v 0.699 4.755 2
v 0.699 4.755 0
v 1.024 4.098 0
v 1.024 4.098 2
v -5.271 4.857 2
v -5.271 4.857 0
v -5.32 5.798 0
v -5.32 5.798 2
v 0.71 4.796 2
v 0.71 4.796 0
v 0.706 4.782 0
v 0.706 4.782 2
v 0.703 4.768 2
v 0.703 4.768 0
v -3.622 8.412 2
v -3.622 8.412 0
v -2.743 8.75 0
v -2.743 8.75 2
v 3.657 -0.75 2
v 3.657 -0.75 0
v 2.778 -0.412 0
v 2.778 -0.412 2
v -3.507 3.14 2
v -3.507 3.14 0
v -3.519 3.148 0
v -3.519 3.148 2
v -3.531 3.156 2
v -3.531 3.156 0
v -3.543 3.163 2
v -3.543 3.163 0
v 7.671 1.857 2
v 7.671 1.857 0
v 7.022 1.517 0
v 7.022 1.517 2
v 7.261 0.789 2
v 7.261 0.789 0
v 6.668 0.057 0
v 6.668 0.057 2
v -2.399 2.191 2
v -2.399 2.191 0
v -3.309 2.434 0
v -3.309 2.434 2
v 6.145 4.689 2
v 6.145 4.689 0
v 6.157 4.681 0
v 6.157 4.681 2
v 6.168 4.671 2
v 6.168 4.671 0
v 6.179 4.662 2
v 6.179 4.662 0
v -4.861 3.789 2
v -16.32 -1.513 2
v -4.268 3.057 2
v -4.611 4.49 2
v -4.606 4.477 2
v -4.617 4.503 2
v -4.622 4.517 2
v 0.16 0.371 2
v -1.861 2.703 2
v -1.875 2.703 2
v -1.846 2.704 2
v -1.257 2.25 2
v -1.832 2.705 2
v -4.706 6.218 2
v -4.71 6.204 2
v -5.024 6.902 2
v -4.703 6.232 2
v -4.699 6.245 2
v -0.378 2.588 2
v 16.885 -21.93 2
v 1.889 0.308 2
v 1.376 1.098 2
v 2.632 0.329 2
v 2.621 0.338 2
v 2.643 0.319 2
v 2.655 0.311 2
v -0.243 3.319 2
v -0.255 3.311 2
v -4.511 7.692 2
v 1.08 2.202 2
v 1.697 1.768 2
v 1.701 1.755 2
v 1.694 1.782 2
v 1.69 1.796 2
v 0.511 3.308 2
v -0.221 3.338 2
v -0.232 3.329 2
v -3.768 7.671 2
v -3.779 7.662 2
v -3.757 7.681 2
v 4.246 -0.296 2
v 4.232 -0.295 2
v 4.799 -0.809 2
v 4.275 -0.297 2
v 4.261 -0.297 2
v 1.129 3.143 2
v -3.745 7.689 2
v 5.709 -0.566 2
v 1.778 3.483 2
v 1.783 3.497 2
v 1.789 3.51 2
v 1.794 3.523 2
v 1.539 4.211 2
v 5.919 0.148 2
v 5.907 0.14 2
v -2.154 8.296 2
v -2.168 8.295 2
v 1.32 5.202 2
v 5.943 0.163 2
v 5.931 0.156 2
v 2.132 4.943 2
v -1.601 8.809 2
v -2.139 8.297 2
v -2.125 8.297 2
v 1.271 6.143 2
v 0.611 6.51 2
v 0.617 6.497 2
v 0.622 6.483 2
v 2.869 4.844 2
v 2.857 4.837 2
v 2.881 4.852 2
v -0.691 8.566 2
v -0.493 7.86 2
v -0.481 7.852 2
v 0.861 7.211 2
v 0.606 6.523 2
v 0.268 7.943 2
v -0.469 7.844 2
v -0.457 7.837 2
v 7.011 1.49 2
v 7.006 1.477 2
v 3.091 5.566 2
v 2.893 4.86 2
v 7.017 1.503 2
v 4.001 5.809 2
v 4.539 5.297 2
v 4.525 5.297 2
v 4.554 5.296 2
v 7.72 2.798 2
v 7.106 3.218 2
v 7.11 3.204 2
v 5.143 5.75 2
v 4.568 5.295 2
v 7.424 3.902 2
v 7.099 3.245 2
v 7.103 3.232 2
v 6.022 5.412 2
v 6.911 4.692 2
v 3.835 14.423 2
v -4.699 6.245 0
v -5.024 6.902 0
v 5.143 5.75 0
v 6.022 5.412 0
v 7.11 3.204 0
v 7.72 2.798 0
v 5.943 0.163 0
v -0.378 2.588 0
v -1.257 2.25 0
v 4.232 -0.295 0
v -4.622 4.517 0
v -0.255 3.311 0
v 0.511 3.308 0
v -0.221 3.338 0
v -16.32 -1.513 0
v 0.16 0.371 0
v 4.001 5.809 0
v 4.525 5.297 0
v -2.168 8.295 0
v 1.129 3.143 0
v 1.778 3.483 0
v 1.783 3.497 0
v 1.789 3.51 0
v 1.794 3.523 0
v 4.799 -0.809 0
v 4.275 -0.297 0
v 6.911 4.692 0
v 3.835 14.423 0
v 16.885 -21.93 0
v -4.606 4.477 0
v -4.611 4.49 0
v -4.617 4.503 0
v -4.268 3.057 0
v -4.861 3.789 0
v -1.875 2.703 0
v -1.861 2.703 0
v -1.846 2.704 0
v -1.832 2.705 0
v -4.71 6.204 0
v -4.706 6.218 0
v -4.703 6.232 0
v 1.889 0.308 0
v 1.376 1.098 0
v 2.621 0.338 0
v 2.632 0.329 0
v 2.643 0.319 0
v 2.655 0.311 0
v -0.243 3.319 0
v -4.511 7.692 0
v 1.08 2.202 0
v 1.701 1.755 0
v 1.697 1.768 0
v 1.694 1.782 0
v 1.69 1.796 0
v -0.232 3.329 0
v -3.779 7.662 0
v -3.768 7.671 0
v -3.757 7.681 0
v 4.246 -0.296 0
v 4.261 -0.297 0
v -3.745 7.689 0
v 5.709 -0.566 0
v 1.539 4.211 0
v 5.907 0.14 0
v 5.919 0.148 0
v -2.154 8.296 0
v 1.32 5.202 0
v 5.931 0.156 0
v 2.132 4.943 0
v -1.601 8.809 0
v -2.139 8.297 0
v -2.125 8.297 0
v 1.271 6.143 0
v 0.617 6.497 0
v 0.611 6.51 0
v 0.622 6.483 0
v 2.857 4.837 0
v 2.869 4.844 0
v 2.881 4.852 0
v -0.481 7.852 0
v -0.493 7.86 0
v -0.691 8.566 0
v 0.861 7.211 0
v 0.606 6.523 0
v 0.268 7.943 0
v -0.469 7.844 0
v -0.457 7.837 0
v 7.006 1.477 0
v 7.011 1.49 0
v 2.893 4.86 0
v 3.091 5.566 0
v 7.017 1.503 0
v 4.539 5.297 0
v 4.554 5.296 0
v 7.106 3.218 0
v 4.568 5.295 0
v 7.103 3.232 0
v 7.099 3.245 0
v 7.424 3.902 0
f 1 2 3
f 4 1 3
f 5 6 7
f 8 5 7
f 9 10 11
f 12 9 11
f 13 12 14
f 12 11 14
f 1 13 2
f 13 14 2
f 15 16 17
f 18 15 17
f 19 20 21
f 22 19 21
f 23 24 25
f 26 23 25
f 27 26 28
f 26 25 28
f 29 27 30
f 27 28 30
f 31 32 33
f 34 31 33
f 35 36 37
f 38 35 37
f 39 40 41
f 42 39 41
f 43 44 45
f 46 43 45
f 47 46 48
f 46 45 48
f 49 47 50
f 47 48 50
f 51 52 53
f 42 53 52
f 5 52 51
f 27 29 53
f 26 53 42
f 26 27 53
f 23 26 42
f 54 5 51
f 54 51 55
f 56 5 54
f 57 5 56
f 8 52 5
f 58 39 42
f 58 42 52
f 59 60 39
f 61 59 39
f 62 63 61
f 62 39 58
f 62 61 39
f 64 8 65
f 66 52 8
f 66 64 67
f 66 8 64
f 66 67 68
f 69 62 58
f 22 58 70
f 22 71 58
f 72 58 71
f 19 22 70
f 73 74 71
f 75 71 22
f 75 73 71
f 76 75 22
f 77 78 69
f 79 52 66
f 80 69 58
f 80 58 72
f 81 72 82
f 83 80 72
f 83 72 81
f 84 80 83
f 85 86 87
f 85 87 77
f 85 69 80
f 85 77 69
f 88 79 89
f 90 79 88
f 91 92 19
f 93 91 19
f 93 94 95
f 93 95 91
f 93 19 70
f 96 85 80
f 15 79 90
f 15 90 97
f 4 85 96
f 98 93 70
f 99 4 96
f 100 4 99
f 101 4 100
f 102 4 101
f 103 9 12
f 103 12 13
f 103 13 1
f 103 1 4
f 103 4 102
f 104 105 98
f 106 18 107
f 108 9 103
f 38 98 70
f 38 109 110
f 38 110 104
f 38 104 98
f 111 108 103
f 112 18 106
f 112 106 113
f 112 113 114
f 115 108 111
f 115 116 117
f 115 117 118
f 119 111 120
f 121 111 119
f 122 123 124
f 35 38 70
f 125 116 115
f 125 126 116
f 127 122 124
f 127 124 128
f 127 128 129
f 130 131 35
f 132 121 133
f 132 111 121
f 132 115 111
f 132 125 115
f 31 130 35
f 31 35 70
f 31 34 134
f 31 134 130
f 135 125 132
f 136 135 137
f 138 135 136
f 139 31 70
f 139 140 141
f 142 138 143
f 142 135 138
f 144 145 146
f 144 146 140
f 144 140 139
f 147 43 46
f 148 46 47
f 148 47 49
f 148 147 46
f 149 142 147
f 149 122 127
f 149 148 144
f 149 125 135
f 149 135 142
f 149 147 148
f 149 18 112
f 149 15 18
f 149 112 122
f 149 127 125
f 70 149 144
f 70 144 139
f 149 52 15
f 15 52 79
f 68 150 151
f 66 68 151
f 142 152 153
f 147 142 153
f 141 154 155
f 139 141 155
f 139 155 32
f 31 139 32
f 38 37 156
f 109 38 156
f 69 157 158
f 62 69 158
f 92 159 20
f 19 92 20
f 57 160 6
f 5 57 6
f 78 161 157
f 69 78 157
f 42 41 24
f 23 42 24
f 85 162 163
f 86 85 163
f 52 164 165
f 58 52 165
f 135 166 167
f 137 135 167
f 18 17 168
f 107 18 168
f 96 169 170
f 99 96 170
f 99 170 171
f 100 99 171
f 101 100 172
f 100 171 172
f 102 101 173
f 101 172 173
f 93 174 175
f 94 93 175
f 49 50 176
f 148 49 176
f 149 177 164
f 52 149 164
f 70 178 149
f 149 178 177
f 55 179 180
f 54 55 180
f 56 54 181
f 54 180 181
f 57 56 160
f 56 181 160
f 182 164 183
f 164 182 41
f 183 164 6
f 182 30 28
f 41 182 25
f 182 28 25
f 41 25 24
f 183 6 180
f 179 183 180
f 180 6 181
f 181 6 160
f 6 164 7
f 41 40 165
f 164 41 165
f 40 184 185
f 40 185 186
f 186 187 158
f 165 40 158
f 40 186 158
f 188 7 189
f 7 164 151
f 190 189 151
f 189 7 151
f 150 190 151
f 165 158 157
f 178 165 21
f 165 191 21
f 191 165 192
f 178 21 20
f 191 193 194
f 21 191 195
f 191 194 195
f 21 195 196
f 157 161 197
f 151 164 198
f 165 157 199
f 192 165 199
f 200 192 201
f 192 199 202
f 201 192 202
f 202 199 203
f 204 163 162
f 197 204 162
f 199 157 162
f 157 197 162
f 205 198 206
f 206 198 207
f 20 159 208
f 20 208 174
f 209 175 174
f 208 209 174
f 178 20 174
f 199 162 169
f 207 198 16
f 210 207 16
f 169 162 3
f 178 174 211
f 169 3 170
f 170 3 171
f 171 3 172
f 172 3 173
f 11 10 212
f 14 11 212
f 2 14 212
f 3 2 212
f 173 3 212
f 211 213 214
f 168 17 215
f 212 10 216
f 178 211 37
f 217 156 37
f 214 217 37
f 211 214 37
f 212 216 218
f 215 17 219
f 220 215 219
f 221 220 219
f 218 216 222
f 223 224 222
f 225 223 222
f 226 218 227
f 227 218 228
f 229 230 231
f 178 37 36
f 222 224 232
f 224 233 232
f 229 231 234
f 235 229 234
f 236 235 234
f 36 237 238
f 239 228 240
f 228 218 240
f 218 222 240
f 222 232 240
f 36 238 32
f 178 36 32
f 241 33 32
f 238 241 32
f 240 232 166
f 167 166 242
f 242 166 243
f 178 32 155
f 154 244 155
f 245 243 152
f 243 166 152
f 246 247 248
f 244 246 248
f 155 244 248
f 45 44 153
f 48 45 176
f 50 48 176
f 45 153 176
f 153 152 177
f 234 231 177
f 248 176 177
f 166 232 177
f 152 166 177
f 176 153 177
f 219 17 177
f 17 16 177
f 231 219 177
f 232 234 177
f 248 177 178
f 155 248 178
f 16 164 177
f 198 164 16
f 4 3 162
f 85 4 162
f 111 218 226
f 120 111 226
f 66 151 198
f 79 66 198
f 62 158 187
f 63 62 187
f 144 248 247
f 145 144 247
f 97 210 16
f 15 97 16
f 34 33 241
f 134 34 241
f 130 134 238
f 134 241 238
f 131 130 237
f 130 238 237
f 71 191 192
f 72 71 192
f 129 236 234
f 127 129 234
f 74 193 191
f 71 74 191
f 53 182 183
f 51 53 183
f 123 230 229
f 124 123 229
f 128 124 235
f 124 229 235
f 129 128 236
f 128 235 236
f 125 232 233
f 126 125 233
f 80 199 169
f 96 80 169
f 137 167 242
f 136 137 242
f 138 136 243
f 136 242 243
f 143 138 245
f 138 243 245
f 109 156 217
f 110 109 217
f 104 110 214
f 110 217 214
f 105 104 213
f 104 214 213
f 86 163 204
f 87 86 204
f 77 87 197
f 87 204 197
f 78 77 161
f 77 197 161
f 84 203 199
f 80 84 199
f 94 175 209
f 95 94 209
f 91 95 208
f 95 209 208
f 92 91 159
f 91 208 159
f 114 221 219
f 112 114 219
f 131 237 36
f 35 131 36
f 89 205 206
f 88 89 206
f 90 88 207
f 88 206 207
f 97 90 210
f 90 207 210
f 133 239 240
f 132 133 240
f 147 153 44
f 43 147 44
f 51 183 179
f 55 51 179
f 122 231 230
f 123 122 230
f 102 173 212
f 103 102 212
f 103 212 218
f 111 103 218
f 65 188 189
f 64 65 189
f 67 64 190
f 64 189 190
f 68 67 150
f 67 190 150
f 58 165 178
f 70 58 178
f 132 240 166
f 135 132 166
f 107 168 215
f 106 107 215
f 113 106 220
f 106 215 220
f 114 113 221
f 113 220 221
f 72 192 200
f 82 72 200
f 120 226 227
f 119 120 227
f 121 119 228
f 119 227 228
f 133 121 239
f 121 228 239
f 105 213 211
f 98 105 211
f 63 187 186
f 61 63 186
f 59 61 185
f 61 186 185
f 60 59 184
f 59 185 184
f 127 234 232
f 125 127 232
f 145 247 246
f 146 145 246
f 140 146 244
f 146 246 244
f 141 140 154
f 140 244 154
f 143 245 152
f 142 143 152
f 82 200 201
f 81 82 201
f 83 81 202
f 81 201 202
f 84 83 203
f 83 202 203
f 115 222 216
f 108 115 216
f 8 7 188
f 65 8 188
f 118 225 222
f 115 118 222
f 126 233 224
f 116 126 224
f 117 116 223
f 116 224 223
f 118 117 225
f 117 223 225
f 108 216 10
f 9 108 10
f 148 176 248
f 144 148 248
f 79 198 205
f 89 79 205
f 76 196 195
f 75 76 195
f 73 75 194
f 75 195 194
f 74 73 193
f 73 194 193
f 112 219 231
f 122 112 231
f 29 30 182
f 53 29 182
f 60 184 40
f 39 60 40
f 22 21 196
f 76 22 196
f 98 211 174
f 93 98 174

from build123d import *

# Parameters (mm, degrees)
F1_DEPTH = 2


with BuildPart() as f1:
    # F0 (on Top) → F1 (new body)
    with BuildSketch(Plane.XY):
        Polygon((16.885106, -21.930141), (3.835107, 14.423427), (-16.31955, -1.512813), (0.15961, 0.370519), align=None)
        with BuildLine():
            ThreePointArc((-4.606246, 4.476535), (-4.614025, 4.49657), (-4.62165, 4.516664))
            Line((-4.62165, 4.516664), (-5.270834, 4.857064))
            Line((-5.270834, 4.857064), (-5.320121, 5.797519))
            Line((-5.320121, 5.797519), (-4.710075, 6.203913))
            ThreePointArc((-4.710075, 6.203913), (-4.704592, 6.224693), (-4.69895, 6.245431))
            Line((-4.69895, 6.245431), (-5.024069, 6.902401))
            Line((-5.024069, 6.902401), (-4.511157, 7.692216))
            Line((-4.511157, 7.692216), (-3.778747, 7.662419))
            ThreePointArc((-3.778747, 7.662419), (-3.762097, 7.676009), (-3.745343, 7.68947))
            Line((-3.745343, 7.68947), (-3.622212, 8.41207))
            Line((-3.622212, 8.41207), (-2.743016, 8.749561))
            Line((-2.743016, 8.749561), (-2.167999, 8.294956))
            ThreePointArc((-2.167999, 8.294956), (-2.146541, 8.296163), (-2.125074, 8.297205))
            Line((-2.125074, 8.297205), (-1.600726, 8.809426))
            Line((-1.600726, 8.809426), (-0.691069, 8.565684))
            Line((-0.691069, 8.565684), (-0.49308, 7.859914))
            ThreePointArc((-0.49308, 7.859914), (-0.475011, 7.848278), (-0.457031, 7.836503))
            Line((-0.457031, 7.836503), (0.268252, 7.942694))
            Line((0.268252, 7.942694), (0.860912, 7.21082))
            Line((0.860912, 7.21082), (0.606246, 6.523465))
            ThreePointArc((0.606246, 6.523465), (0.614025, 6.50343), (0.62165, 6.483336))
            Line((0.62165, 6.483336), (1.270834, 6.142936))
            Line((1.270834, 6.142936), (1.320121, 5.202481))
            Line((1.320121, 5.202481), (0.710075, 4.796087))
            ThreePointArc((0.710075, 4.796087), (0.704592, 4.775307), (0.69895, 4.754569))
            Line((0.69895, 4.754569), (1.024069, 4.097599))
            Line((1.024069, 4.097599), (0.511157, 3.307784))
            Line((0.511157, 3.307784), (-0.221253, 3.337581))
            ThreePointArc((-0.221253, 3.337581), (-0.237903, 3.323991), (-0.254657, 3.31053))
            Line((-0.254657, 3.31053), (-0.377788, 2.58793))
            Line((-0.377788, 2.58793), (-1.256984, 2.250439))
            Line((-1.256984, 2.250439), (-1.832001, 2.705044))
            ThreePointArc((-1.832001, 2.705044), (-1.853459, 2.703837), (-1.874926, 2.702795))
            Line((-1.874926, 2.702795), (-2.399274, 2.190574))
            Line((-2.399274, 2.190574), (-3.308931, 2.434316))
            Line((-3.308931, 2.434316), (-3.50692, 3.140086))
            ThreePointArc((-3.50692, 3.140086), (-3.524989, 3.151722), (-3.542969, 3.163497))
            Line((-3.542969, 3.163497), (-4.268252, 3.057306))
            Line((-4.268252, 3.057306), (-4.860912, 3.78918))
            Line((-4.860912, 3.78918), (-4.606246, 4.476535))
        make_face(mode=Mode.SUBTRACT)
        with BuildLine():
            ThreePointArc((2.857031, 4.836503), (2.875011, 4.848278), (2.89308, 4.859914))
            Line((2.89308, 4.859914), (3.091069, 5.565684))
            Line((3.091069, 5.565684), (4.000726, 5.809426))
            Line((4.000726, 5.809426), (4.525074, 5.297205))
            ThreePointArc((4.525074, 5.297205), (4.546541, 5.296163), (4.567999, 5.294956))
            Line((4.567999, 5.294956), (5.143016, 5.749561))
            Line((5.143016, 5.749561), (6.022212, 5.41207))
            Line((6.022212, 5.41207), (6.145343, 4.68947))
            ThreePointArc((6.145343, 4.68947), (6.162097, 4.676009), (6.178747, 4.662419))
            Line((6.178747, 4.662419), (6.911157, 4.692216))
            Line((6.911157, 4.692216), (7.424069, 3.902401))
            Line((7.424069, 3.902401), (7.09895, 3.245431))
            ThreePointArc((7.09895, 3.245431), (7.104592, 3.224693), (7.110075, 3.203913))
            Line((7.110075, 3.203913), (7.720121, 2.797519))
            Line((7.720121, 2.797519), (7.670834, 1.857064))
            Line((7.670834, 1.857064), (7.02165, 1.516664))
            ThreePointArc((7.02165, 1.516664), (7.014025, 1.49657), (7.006246, 1.476535))
            Line((7.006246, 1.476535), (7.260912, 0.78918))
            Line((7.260912, 0.78918), (6.668252, 0.057306))
            Line((6.668252, 0.057306), (5.942969, 0.163497))
            ThreePointArc((5.942969, 0.163497), (5.924989, 0.151722), (5.90692, 0.140086))
            Line((5.90692, 0.140086), (5.708931, -0.565684))
            Line((5.708931, -0.565684), (4.799274, -0.809426))
            Line((4.799274, -0.809426), (4.274926, -0.297205))
            ThreePointArc((4.274926, -0.297205), (4.253459, -0.296163), (4.232001, -0.294956))
            Line((4.232001, -0.294956), (3.656984, -0.749561))
            Line((3.656984, -0.749561), (2.777788, -0.41207))
            Line((2.777788, -0.41207), (2.654657, 0.31053))
            ThreePointArc((2.654657, 0.31053), (2.637903, 0.323991), (2.621253, 0.337581))
            Line((2.621253, 0.337581), (1.888843, 0.307784))
            Line((1.888843, 0.307784), (1.375931, 1.097599))
            Line((1.375931, 1.097599), (1.70105, 1.754569))
            ThreePointArc((1.70105, 1.754569), (1.695408, 1.775307), (1.689925, 1.796087))
            Line((1.689925, 1.796087), (1.079879, 2.202481))
            Line((1.079879, 2.202481), (1.129166, 3.142936))
            Line((1.129166, 3.142936), (1.77835, 3.483336))
            ThreePointArc((1.77835, 3.483336), (1.785975, 3.50343), (1.793754, 3.523465))
            Line((1.793754, 3.523465), (1.539088, 4.21082))
            Line((1.539088, 4.21082), (2.131748, 4.942694))
            Line((2.131748, 4.942694), (2.857031, 4.836503))
        make_face(mode=Mode.SUBTRACT)
    extrude(amount=F1_DEPTH)


solid = f1.part
